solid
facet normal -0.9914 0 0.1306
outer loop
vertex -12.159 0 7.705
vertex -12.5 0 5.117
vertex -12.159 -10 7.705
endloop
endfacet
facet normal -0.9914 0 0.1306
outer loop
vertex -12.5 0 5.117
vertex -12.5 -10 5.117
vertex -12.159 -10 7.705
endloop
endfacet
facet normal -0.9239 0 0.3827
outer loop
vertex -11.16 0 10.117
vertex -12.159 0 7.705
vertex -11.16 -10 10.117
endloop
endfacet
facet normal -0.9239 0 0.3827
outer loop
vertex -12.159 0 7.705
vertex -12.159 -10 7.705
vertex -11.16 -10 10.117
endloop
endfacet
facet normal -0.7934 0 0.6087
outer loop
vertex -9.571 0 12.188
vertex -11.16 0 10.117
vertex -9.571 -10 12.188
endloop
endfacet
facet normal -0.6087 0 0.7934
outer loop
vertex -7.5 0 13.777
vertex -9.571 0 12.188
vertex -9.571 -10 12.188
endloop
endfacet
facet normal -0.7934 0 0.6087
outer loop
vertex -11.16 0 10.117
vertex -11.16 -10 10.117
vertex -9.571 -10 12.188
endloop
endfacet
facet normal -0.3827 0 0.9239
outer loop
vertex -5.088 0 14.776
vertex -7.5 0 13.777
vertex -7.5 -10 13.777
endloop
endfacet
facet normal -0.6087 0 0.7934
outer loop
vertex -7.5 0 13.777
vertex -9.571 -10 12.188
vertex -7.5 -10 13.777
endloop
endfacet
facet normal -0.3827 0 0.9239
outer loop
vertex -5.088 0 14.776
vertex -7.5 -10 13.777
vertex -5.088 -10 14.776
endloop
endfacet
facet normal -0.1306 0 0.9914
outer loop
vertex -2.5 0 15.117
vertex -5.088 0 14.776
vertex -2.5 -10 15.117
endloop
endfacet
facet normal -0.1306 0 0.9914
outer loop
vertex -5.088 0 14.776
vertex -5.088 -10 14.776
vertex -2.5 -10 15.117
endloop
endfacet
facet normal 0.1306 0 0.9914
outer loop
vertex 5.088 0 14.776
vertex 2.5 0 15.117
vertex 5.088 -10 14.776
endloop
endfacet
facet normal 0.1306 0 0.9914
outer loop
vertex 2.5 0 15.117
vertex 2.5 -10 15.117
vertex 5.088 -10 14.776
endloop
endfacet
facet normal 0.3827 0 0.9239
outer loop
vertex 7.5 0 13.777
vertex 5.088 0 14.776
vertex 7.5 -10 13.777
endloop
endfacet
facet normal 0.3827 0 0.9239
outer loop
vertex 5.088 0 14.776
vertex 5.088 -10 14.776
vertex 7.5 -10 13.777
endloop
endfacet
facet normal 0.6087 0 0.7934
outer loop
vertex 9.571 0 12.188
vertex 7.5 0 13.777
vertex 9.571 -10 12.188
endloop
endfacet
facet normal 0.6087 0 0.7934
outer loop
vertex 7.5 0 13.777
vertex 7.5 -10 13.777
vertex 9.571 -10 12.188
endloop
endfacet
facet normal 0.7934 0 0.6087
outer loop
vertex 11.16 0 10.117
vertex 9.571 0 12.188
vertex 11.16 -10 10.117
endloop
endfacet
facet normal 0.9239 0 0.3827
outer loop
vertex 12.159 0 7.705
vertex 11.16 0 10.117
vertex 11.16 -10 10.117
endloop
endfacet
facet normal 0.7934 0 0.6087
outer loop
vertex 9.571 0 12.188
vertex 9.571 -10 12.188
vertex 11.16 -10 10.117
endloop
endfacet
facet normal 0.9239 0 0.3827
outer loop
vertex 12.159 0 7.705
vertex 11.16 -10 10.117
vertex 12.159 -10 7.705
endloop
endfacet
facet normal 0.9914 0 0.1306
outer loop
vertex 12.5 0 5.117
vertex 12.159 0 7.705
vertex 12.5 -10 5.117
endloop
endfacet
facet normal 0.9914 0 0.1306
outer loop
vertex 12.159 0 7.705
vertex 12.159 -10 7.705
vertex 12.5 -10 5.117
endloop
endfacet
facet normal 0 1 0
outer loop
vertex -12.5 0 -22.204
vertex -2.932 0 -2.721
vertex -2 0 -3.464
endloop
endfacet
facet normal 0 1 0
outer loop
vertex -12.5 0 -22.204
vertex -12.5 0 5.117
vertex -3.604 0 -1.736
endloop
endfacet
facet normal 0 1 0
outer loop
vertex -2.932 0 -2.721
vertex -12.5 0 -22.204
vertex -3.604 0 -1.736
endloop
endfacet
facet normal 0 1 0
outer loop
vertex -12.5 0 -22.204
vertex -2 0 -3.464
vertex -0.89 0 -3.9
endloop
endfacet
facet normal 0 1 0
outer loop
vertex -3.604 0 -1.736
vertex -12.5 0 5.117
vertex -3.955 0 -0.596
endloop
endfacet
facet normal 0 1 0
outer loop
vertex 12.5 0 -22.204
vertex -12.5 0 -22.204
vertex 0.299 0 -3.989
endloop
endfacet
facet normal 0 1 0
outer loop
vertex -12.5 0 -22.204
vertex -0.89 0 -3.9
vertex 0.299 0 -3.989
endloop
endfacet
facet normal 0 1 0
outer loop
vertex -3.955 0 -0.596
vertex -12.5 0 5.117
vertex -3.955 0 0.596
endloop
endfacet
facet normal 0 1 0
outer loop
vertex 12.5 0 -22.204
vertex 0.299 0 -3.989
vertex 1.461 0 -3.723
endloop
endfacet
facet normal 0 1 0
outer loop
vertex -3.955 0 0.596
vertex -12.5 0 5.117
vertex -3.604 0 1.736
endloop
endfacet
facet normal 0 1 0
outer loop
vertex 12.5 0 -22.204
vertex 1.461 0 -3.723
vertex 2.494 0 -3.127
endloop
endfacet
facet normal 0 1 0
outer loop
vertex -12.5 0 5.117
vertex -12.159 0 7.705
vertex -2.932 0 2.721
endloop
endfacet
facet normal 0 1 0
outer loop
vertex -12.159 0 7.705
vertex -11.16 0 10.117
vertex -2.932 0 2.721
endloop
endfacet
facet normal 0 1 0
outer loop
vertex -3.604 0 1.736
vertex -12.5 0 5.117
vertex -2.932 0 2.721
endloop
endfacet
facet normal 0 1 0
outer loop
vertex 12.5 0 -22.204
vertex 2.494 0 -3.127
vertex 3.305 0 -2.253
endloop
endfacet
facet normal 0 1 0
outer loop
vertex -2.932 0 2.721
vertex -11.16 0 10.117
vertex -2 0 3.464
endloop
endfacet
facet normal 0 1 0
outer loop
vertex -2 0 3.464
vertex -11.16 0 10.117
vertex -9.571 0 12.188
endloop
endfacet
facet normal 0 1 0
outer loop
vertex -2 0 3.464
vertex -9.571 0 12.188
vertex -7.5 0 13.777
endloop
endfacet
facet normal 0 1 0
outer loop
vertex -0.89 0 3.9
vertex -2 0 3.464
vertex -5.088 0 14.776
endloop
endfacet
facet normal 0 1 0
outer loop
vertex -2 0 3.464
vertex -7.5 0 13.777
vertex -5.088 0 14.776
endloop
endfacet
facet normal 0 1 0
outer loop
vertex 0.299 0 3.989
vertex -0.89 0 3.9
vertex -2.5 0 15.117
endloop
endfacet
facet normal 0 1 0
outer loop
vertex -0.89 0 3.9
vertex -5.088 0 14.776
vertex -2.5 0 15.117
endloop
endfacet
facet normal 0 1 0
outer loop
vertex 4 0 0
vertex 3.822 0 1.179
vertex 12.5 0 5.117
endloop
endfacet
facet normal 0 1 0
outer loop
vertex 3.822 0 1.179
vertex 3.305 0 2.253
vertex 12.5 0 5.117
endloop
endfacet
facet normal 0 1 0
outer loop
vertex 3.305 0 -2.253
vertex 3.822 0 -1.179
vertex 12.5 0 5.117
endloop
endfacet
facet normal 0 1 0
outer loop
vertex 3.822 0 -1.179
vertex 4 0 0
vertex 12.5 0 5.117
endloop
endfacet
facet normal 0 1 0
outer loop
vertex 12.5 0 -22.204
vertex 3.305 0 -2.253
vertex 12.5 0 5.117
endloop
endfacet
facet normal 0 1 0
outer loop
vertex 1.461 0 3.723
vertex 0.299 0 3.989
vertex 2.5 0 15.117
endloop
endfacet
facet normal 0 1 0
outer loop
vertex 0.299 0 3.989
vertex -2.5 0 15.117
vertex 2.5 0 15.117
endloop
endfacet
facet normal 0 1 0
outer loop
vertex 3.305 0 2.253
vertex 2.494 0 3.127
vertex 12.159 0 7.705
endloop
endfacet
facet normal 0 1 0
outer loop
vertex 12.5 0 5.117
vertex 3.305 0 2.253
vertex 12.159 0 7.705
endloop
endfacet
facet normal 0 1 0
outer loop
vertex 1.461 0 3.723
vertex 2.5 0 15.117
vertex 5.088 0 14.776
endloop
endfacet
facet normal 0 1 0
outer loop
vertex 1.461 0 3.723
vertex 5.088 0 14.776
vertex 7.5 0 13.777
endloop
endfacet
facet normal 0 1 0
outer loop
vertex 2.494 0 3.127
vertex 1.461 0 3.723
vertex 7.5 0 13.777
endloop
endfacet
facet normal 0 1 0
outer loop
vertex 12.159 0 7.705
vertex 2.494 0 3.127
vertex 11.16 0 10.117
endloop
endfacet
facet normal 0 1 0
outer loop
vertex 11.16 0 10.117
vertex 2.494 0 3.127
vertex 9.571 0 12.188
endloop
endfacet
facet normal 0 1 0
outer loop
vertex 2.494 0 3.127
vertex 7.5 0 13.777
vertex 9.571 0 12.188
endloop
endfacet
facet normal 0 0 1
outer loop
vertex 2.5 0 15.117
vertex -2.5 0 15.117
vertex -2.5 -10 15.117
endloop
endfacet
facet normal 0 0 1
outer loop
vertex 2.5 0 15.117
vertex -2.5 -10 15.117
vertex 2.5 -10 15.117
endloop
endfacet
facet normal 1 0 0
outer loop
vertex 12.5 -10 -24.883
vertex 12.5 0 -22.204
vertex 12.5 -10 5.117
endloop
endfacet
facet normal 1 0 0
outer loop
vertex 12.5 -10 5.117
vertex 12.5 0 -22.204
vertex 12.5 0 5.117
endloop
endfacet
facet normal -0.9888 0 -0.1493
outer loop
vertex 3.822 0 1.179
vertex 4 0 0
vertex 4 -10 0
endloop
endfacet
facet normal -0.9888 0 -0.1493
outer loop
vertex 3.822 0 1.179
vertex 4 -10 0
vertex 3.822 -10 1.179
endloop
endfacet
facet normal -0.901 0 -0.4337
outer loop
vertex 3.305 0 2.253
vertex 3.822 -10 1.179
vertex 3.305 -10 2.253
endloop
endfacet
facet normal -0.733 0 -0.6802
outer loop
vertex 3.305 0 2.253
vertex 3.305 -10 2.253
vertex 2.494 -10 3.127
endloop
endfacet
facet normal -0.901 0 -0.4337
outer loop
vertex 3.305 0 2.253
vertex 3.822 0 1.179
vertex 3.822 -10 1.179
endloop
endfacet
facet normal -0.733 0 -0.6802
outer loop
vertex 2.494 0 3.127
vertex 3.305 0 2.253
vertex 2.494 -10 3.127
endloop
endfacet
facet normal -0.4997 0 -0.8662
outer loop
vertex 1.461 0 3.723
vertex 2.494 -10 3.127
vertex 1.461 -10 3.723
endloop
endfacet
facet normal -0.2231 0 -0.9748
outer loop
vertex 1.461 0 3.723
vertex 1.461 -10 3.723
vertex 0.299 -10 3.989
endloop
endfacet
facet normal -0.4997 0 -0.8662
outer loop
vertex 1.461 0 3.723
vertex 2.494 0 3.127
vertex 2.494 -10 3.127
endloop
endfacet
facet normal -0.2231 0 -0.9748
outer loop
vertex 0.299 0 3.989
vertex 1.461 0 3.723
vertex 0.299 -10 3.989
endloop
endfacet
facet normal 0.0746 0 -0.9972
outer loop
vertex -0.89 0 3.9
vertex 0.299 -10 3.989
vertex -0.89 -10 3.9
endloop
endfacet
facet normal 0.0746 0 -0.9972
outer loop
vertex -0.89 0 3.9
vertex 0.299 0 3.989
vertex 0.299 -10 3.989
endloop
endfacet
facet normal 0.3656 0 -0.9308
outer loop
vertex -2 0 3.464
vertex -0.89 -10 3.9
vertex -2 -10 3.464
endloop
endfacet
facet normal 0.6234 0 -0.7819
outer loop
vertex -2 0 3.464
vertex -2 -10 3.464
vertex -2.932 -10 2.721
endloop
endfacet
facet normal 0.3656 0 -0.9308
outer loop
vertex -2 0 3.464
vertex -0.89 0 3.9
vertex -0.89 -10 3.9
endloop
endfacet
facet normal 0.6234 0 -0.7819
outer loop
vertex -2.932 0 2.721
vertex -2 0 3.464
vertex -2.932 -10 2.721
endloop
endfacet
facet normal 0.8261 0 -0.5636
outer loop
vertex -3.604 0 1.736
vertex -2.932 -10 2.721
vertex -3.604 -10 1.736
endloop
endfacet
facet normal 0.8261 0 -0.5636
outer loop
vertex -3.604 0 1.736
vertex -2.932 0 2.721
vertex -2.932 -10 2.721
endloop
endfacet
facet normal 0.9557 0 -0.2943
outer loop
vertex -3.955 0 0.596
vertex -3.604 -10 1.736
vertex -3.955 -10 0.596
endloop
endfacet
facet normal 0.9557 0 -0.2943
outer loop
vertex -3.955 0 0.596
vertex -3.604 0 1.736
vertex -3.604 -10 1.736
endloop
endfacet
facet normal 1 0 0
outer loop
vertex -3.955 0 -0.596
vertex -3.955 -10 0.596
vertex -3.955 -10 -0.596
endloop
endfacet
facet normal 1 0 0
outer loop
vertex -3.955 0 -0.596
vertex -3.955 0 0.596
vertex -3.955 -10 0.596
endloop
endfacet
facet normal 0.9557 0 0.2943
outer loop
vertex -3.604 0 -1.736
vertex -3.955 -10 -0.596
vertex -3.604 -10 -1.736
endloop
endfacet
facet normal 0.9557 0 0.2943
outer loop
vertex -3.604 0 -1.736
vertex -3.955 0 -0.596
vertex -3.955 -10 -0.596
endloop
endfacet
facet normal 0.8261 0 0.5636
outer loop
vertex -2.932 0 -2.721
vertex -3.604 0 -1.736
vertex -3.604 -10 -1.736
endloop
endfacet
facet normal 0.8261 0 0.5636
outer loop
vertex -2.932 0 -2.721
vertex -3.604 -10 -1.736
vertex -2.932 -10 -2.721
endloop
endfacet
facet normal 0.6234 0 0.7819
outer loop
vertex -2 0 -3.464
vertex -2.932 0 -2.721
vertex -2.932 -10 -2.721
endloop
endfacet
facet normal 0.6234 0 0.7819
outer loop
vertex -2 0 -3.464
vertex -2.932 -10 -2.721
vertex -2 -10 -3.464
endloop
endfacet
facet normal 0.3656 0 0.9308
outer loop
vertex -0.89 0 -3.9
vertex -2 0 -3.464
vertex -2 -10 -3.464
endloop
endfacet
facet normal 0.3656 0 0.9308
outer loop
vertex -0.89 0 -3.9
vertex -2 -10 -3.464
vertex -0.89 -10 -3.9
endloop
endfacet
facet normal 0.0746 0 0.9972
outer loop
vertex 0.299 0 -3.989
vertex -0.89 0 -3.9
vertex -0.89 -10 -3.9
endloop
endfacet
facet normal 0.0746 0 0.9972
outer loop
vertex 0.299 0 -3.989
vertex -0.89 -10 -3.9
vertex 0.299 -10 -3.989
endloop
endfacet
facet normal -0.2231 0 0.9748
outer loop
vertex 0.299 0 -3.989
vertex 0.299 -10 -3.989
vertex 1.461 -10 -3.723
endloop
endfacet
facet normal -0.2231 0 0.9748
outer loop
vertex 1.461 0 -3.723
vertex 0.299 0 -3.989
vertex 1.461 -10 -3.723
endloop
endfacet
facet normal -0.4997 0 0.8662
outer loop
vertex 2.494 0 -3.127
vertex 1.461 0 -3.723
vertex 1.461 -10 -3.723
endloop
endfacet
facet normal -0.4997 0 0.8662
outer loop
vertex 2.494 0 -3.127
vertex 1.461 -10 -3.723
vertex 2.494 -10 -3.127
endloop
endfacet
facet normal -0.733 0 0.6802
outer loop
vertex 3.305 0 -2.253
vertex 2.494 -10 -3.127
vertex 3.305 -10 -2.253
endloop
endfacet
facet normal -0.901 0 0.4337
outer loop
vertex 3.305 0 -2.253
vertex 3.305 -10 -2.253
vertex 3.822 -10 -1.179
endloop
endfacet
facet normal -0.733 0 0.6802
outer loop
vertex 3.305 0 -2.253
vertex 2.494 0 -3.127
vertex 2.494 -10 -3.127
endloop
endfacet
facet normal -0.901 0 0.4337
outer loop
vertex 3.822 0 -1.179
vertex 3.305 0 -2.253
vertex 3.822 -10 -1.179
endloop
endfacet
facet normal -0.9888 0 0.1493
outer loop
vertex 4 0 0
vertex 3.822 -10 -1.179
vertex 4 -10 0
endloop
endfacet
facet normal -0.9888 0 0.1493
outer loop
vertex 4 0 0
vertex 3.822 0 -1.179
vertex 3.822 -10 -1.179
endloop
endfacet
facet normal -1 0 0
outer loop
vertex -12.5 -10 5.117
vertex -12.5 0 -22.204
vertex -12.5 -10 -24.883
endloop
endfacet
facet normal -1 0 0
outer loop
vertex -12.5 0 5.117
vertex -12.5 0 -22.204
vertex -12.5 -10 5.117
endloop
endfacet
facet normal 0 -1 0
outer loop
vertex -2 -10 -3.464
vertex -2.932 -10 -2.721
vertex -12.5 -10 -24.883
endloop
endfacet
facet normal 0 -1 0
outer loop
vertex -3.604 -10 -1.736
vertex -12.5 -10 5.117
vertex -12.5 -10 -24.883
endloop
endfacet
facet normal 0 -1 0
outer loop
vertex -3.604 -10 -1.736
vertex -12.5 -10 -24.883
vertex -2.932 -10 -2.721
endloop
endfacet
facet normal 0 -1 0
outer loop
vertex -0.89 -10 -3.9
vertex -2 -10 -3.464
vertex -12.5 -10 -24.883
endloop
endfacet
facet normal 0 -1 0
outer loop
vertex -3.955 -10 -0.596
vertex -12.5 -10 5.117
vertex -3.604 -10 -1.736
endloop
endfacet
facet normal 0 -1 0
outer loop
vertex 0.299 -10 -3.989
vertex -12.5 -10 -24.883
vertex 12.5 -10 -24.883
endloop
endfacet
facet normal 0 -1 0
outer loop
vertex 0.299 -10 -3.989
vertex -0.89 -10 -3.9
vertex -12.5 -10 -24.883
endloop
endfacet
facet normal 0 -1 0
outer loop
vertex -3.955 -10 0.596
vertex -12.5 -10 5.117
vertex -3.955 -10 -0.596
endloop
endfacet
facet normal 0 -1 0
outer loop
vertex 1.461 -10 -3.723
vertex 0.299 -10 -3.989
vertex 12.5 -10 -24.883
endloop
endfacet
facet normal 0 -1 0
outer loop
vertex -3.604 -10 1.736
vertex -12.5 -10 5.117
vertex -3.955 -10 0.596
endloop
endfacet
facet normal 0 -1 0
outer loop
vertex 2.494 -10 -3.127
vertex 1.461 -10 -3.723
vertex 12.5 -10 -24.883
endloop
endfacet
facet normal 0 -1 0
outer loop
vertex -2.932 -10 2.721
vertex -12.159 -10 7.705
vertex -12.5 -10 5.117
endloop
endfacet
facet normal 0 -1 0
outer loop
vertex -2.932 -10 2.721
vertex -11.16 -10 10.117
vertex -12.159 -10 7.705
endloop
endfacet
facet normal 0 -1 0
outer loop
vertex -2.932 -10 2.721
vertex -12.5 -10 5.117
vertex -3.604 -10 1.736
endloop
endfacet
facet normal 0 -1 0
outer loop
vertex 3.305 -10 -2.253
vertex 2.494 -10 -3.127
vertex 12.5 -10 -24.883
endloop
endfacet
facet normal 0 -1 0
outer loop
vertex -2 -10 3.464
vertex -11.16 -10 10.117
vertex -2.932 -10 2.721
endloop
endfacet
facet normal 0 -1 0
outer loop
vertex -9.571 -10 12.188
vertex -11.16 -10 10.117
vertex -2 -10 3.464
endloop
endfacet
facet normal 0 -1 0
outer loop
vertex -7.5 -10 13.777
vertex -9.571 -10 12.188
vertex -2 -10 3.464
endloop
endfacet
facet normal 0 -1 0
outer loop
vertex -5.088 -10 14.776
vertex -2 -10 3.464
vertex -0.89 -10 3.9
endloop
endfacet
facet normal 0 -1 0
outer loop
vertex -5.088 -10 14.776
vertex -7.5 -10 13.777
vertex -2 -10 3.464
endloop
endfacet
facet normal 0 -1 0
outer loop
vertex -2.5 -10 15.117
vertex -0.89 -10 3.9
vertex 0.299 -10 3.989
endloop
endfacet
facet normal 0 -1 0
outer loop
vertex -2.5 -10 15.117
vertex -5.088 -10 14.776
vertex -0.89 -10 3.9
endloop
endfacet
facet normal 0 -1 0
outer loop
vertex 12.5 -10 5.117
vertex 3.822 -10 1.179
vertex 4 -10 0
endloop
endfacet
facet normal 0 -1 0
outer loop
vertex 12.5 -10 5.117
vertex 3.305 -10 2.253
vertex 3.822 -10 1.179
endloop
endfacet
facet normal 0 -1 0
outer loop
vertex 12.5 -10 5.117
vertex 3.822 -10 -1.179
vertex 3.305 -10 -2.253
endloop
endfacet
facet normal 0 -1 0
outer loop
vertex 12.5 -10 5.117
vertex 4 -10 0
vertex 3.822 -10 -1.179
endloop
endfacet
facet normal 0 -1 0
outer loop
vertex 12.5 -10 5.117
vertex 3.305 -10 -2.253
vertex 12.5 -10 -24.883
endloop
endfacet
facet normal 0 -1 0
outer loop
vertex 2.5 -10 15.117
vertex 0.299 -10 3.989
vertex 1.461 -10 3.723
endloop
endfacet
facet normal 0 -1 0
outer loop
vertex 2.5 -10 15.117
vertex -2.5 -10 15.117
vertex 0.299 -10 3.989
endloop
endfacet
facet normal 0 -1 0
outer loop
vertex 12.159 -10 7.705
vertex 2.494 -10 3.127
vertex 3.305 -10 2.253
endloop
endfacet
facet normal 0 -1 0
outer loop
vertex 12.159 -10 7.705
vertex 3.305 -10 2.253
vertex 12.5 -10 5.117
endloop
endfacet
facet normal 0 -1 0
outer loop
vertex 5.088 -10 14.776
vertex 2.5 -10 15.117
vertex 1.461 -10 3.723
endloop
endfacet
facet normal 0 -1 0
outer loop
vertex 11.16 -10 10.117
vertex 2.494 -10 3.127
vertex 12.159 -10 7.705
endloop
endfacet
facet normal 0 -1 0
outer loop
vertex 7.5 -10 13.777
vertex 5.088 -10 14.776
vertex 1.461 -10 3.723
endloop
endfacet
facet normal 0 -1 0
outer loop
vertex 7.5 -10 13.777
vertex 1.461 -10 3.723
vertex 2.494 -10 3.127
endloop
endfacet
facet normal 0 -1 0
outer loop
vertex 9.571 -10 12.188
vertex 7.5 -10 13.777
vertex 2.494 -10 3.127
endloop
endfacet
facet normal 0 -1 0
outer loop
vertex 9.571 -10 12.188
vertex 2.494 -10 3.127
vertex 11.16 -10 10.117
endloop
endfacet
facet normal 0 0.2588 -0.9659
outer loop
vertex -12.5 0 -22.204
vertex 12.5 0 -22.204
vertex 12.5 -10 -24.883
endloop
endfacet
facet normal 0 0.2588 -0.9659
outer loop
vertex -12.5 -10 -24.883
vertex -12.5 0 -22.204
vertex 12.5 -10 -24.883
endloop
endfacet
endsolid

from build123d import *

# Parameters (mm, degrees)
F0_W     = 25
F0_H     = 40
F0_R     = 4
F1_DEPTH = 10
F3_DEPTH = 25.001
F4_R     = 10


with BuildPart() as f1:
    # F0 (on Front) → F1 (new body)
    with BuildSketch(Plane.XZ):
        with Locations((0, -4.883111)):
            Rectangle(F0_W, F0_H)
        Circle(F0_R, mode=Mode.SUBTRACT)
    extrude(amount=F1_DEPTH)

    # F2 (on face) → F3 (cut, through all)
    with BuildSketch(Plane.YZ.offset(12.5)):
        Polygon((-10, -24.883111), (0, -24.883111), (0, -22.203619), align=None)
    extrude(amount=-F3_DEPTH, mode=Mode.SUBTRACT)

    # F4
    f4_edges = [f1.edges().sort_by_distance(p)[0] for p in [
        (12.5, -5, 15.116889),
        (-12.5, -5, 15.116889),
    ]]
    fillet(f4_edges, radius=F4_R)


solid = f1.part
